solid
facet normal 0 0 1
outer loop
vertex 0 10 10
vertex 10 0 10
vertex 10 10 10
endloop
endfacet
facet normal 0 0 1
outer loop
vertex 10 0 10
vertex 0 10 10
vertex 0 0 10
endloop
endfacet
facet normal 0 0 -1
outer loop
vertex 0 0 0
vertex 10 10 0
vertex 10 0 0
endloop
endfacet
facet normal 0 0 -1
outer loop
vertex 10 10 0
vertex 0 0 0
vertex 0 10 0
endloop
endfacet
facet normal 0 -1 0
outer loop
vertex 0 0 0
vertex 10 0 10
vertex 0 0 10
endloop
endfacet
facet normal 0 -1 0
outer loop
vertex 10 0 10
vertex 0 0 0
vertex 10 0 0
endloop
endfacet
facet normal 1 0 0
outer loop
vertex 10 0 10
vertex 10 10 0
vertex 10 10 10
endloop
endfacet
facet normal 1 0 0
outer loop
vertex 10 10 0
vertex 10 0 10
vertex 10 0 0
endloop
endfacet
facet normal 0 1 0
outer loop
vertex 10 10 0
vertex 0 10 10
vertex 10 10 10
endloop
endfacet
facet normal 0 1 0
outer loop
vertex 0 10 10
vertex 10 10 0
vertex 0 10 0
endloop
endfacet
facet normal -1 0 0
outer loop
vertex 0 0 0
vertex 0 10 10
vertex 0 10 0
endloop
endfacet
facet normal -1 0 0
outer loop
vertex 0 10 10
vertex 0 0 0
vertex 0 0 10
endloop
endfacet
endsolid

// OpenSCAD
// A library that isn't in the design (ADR-0071 §6).
include <MCAD/involute_gears.scad>
cube(10);
